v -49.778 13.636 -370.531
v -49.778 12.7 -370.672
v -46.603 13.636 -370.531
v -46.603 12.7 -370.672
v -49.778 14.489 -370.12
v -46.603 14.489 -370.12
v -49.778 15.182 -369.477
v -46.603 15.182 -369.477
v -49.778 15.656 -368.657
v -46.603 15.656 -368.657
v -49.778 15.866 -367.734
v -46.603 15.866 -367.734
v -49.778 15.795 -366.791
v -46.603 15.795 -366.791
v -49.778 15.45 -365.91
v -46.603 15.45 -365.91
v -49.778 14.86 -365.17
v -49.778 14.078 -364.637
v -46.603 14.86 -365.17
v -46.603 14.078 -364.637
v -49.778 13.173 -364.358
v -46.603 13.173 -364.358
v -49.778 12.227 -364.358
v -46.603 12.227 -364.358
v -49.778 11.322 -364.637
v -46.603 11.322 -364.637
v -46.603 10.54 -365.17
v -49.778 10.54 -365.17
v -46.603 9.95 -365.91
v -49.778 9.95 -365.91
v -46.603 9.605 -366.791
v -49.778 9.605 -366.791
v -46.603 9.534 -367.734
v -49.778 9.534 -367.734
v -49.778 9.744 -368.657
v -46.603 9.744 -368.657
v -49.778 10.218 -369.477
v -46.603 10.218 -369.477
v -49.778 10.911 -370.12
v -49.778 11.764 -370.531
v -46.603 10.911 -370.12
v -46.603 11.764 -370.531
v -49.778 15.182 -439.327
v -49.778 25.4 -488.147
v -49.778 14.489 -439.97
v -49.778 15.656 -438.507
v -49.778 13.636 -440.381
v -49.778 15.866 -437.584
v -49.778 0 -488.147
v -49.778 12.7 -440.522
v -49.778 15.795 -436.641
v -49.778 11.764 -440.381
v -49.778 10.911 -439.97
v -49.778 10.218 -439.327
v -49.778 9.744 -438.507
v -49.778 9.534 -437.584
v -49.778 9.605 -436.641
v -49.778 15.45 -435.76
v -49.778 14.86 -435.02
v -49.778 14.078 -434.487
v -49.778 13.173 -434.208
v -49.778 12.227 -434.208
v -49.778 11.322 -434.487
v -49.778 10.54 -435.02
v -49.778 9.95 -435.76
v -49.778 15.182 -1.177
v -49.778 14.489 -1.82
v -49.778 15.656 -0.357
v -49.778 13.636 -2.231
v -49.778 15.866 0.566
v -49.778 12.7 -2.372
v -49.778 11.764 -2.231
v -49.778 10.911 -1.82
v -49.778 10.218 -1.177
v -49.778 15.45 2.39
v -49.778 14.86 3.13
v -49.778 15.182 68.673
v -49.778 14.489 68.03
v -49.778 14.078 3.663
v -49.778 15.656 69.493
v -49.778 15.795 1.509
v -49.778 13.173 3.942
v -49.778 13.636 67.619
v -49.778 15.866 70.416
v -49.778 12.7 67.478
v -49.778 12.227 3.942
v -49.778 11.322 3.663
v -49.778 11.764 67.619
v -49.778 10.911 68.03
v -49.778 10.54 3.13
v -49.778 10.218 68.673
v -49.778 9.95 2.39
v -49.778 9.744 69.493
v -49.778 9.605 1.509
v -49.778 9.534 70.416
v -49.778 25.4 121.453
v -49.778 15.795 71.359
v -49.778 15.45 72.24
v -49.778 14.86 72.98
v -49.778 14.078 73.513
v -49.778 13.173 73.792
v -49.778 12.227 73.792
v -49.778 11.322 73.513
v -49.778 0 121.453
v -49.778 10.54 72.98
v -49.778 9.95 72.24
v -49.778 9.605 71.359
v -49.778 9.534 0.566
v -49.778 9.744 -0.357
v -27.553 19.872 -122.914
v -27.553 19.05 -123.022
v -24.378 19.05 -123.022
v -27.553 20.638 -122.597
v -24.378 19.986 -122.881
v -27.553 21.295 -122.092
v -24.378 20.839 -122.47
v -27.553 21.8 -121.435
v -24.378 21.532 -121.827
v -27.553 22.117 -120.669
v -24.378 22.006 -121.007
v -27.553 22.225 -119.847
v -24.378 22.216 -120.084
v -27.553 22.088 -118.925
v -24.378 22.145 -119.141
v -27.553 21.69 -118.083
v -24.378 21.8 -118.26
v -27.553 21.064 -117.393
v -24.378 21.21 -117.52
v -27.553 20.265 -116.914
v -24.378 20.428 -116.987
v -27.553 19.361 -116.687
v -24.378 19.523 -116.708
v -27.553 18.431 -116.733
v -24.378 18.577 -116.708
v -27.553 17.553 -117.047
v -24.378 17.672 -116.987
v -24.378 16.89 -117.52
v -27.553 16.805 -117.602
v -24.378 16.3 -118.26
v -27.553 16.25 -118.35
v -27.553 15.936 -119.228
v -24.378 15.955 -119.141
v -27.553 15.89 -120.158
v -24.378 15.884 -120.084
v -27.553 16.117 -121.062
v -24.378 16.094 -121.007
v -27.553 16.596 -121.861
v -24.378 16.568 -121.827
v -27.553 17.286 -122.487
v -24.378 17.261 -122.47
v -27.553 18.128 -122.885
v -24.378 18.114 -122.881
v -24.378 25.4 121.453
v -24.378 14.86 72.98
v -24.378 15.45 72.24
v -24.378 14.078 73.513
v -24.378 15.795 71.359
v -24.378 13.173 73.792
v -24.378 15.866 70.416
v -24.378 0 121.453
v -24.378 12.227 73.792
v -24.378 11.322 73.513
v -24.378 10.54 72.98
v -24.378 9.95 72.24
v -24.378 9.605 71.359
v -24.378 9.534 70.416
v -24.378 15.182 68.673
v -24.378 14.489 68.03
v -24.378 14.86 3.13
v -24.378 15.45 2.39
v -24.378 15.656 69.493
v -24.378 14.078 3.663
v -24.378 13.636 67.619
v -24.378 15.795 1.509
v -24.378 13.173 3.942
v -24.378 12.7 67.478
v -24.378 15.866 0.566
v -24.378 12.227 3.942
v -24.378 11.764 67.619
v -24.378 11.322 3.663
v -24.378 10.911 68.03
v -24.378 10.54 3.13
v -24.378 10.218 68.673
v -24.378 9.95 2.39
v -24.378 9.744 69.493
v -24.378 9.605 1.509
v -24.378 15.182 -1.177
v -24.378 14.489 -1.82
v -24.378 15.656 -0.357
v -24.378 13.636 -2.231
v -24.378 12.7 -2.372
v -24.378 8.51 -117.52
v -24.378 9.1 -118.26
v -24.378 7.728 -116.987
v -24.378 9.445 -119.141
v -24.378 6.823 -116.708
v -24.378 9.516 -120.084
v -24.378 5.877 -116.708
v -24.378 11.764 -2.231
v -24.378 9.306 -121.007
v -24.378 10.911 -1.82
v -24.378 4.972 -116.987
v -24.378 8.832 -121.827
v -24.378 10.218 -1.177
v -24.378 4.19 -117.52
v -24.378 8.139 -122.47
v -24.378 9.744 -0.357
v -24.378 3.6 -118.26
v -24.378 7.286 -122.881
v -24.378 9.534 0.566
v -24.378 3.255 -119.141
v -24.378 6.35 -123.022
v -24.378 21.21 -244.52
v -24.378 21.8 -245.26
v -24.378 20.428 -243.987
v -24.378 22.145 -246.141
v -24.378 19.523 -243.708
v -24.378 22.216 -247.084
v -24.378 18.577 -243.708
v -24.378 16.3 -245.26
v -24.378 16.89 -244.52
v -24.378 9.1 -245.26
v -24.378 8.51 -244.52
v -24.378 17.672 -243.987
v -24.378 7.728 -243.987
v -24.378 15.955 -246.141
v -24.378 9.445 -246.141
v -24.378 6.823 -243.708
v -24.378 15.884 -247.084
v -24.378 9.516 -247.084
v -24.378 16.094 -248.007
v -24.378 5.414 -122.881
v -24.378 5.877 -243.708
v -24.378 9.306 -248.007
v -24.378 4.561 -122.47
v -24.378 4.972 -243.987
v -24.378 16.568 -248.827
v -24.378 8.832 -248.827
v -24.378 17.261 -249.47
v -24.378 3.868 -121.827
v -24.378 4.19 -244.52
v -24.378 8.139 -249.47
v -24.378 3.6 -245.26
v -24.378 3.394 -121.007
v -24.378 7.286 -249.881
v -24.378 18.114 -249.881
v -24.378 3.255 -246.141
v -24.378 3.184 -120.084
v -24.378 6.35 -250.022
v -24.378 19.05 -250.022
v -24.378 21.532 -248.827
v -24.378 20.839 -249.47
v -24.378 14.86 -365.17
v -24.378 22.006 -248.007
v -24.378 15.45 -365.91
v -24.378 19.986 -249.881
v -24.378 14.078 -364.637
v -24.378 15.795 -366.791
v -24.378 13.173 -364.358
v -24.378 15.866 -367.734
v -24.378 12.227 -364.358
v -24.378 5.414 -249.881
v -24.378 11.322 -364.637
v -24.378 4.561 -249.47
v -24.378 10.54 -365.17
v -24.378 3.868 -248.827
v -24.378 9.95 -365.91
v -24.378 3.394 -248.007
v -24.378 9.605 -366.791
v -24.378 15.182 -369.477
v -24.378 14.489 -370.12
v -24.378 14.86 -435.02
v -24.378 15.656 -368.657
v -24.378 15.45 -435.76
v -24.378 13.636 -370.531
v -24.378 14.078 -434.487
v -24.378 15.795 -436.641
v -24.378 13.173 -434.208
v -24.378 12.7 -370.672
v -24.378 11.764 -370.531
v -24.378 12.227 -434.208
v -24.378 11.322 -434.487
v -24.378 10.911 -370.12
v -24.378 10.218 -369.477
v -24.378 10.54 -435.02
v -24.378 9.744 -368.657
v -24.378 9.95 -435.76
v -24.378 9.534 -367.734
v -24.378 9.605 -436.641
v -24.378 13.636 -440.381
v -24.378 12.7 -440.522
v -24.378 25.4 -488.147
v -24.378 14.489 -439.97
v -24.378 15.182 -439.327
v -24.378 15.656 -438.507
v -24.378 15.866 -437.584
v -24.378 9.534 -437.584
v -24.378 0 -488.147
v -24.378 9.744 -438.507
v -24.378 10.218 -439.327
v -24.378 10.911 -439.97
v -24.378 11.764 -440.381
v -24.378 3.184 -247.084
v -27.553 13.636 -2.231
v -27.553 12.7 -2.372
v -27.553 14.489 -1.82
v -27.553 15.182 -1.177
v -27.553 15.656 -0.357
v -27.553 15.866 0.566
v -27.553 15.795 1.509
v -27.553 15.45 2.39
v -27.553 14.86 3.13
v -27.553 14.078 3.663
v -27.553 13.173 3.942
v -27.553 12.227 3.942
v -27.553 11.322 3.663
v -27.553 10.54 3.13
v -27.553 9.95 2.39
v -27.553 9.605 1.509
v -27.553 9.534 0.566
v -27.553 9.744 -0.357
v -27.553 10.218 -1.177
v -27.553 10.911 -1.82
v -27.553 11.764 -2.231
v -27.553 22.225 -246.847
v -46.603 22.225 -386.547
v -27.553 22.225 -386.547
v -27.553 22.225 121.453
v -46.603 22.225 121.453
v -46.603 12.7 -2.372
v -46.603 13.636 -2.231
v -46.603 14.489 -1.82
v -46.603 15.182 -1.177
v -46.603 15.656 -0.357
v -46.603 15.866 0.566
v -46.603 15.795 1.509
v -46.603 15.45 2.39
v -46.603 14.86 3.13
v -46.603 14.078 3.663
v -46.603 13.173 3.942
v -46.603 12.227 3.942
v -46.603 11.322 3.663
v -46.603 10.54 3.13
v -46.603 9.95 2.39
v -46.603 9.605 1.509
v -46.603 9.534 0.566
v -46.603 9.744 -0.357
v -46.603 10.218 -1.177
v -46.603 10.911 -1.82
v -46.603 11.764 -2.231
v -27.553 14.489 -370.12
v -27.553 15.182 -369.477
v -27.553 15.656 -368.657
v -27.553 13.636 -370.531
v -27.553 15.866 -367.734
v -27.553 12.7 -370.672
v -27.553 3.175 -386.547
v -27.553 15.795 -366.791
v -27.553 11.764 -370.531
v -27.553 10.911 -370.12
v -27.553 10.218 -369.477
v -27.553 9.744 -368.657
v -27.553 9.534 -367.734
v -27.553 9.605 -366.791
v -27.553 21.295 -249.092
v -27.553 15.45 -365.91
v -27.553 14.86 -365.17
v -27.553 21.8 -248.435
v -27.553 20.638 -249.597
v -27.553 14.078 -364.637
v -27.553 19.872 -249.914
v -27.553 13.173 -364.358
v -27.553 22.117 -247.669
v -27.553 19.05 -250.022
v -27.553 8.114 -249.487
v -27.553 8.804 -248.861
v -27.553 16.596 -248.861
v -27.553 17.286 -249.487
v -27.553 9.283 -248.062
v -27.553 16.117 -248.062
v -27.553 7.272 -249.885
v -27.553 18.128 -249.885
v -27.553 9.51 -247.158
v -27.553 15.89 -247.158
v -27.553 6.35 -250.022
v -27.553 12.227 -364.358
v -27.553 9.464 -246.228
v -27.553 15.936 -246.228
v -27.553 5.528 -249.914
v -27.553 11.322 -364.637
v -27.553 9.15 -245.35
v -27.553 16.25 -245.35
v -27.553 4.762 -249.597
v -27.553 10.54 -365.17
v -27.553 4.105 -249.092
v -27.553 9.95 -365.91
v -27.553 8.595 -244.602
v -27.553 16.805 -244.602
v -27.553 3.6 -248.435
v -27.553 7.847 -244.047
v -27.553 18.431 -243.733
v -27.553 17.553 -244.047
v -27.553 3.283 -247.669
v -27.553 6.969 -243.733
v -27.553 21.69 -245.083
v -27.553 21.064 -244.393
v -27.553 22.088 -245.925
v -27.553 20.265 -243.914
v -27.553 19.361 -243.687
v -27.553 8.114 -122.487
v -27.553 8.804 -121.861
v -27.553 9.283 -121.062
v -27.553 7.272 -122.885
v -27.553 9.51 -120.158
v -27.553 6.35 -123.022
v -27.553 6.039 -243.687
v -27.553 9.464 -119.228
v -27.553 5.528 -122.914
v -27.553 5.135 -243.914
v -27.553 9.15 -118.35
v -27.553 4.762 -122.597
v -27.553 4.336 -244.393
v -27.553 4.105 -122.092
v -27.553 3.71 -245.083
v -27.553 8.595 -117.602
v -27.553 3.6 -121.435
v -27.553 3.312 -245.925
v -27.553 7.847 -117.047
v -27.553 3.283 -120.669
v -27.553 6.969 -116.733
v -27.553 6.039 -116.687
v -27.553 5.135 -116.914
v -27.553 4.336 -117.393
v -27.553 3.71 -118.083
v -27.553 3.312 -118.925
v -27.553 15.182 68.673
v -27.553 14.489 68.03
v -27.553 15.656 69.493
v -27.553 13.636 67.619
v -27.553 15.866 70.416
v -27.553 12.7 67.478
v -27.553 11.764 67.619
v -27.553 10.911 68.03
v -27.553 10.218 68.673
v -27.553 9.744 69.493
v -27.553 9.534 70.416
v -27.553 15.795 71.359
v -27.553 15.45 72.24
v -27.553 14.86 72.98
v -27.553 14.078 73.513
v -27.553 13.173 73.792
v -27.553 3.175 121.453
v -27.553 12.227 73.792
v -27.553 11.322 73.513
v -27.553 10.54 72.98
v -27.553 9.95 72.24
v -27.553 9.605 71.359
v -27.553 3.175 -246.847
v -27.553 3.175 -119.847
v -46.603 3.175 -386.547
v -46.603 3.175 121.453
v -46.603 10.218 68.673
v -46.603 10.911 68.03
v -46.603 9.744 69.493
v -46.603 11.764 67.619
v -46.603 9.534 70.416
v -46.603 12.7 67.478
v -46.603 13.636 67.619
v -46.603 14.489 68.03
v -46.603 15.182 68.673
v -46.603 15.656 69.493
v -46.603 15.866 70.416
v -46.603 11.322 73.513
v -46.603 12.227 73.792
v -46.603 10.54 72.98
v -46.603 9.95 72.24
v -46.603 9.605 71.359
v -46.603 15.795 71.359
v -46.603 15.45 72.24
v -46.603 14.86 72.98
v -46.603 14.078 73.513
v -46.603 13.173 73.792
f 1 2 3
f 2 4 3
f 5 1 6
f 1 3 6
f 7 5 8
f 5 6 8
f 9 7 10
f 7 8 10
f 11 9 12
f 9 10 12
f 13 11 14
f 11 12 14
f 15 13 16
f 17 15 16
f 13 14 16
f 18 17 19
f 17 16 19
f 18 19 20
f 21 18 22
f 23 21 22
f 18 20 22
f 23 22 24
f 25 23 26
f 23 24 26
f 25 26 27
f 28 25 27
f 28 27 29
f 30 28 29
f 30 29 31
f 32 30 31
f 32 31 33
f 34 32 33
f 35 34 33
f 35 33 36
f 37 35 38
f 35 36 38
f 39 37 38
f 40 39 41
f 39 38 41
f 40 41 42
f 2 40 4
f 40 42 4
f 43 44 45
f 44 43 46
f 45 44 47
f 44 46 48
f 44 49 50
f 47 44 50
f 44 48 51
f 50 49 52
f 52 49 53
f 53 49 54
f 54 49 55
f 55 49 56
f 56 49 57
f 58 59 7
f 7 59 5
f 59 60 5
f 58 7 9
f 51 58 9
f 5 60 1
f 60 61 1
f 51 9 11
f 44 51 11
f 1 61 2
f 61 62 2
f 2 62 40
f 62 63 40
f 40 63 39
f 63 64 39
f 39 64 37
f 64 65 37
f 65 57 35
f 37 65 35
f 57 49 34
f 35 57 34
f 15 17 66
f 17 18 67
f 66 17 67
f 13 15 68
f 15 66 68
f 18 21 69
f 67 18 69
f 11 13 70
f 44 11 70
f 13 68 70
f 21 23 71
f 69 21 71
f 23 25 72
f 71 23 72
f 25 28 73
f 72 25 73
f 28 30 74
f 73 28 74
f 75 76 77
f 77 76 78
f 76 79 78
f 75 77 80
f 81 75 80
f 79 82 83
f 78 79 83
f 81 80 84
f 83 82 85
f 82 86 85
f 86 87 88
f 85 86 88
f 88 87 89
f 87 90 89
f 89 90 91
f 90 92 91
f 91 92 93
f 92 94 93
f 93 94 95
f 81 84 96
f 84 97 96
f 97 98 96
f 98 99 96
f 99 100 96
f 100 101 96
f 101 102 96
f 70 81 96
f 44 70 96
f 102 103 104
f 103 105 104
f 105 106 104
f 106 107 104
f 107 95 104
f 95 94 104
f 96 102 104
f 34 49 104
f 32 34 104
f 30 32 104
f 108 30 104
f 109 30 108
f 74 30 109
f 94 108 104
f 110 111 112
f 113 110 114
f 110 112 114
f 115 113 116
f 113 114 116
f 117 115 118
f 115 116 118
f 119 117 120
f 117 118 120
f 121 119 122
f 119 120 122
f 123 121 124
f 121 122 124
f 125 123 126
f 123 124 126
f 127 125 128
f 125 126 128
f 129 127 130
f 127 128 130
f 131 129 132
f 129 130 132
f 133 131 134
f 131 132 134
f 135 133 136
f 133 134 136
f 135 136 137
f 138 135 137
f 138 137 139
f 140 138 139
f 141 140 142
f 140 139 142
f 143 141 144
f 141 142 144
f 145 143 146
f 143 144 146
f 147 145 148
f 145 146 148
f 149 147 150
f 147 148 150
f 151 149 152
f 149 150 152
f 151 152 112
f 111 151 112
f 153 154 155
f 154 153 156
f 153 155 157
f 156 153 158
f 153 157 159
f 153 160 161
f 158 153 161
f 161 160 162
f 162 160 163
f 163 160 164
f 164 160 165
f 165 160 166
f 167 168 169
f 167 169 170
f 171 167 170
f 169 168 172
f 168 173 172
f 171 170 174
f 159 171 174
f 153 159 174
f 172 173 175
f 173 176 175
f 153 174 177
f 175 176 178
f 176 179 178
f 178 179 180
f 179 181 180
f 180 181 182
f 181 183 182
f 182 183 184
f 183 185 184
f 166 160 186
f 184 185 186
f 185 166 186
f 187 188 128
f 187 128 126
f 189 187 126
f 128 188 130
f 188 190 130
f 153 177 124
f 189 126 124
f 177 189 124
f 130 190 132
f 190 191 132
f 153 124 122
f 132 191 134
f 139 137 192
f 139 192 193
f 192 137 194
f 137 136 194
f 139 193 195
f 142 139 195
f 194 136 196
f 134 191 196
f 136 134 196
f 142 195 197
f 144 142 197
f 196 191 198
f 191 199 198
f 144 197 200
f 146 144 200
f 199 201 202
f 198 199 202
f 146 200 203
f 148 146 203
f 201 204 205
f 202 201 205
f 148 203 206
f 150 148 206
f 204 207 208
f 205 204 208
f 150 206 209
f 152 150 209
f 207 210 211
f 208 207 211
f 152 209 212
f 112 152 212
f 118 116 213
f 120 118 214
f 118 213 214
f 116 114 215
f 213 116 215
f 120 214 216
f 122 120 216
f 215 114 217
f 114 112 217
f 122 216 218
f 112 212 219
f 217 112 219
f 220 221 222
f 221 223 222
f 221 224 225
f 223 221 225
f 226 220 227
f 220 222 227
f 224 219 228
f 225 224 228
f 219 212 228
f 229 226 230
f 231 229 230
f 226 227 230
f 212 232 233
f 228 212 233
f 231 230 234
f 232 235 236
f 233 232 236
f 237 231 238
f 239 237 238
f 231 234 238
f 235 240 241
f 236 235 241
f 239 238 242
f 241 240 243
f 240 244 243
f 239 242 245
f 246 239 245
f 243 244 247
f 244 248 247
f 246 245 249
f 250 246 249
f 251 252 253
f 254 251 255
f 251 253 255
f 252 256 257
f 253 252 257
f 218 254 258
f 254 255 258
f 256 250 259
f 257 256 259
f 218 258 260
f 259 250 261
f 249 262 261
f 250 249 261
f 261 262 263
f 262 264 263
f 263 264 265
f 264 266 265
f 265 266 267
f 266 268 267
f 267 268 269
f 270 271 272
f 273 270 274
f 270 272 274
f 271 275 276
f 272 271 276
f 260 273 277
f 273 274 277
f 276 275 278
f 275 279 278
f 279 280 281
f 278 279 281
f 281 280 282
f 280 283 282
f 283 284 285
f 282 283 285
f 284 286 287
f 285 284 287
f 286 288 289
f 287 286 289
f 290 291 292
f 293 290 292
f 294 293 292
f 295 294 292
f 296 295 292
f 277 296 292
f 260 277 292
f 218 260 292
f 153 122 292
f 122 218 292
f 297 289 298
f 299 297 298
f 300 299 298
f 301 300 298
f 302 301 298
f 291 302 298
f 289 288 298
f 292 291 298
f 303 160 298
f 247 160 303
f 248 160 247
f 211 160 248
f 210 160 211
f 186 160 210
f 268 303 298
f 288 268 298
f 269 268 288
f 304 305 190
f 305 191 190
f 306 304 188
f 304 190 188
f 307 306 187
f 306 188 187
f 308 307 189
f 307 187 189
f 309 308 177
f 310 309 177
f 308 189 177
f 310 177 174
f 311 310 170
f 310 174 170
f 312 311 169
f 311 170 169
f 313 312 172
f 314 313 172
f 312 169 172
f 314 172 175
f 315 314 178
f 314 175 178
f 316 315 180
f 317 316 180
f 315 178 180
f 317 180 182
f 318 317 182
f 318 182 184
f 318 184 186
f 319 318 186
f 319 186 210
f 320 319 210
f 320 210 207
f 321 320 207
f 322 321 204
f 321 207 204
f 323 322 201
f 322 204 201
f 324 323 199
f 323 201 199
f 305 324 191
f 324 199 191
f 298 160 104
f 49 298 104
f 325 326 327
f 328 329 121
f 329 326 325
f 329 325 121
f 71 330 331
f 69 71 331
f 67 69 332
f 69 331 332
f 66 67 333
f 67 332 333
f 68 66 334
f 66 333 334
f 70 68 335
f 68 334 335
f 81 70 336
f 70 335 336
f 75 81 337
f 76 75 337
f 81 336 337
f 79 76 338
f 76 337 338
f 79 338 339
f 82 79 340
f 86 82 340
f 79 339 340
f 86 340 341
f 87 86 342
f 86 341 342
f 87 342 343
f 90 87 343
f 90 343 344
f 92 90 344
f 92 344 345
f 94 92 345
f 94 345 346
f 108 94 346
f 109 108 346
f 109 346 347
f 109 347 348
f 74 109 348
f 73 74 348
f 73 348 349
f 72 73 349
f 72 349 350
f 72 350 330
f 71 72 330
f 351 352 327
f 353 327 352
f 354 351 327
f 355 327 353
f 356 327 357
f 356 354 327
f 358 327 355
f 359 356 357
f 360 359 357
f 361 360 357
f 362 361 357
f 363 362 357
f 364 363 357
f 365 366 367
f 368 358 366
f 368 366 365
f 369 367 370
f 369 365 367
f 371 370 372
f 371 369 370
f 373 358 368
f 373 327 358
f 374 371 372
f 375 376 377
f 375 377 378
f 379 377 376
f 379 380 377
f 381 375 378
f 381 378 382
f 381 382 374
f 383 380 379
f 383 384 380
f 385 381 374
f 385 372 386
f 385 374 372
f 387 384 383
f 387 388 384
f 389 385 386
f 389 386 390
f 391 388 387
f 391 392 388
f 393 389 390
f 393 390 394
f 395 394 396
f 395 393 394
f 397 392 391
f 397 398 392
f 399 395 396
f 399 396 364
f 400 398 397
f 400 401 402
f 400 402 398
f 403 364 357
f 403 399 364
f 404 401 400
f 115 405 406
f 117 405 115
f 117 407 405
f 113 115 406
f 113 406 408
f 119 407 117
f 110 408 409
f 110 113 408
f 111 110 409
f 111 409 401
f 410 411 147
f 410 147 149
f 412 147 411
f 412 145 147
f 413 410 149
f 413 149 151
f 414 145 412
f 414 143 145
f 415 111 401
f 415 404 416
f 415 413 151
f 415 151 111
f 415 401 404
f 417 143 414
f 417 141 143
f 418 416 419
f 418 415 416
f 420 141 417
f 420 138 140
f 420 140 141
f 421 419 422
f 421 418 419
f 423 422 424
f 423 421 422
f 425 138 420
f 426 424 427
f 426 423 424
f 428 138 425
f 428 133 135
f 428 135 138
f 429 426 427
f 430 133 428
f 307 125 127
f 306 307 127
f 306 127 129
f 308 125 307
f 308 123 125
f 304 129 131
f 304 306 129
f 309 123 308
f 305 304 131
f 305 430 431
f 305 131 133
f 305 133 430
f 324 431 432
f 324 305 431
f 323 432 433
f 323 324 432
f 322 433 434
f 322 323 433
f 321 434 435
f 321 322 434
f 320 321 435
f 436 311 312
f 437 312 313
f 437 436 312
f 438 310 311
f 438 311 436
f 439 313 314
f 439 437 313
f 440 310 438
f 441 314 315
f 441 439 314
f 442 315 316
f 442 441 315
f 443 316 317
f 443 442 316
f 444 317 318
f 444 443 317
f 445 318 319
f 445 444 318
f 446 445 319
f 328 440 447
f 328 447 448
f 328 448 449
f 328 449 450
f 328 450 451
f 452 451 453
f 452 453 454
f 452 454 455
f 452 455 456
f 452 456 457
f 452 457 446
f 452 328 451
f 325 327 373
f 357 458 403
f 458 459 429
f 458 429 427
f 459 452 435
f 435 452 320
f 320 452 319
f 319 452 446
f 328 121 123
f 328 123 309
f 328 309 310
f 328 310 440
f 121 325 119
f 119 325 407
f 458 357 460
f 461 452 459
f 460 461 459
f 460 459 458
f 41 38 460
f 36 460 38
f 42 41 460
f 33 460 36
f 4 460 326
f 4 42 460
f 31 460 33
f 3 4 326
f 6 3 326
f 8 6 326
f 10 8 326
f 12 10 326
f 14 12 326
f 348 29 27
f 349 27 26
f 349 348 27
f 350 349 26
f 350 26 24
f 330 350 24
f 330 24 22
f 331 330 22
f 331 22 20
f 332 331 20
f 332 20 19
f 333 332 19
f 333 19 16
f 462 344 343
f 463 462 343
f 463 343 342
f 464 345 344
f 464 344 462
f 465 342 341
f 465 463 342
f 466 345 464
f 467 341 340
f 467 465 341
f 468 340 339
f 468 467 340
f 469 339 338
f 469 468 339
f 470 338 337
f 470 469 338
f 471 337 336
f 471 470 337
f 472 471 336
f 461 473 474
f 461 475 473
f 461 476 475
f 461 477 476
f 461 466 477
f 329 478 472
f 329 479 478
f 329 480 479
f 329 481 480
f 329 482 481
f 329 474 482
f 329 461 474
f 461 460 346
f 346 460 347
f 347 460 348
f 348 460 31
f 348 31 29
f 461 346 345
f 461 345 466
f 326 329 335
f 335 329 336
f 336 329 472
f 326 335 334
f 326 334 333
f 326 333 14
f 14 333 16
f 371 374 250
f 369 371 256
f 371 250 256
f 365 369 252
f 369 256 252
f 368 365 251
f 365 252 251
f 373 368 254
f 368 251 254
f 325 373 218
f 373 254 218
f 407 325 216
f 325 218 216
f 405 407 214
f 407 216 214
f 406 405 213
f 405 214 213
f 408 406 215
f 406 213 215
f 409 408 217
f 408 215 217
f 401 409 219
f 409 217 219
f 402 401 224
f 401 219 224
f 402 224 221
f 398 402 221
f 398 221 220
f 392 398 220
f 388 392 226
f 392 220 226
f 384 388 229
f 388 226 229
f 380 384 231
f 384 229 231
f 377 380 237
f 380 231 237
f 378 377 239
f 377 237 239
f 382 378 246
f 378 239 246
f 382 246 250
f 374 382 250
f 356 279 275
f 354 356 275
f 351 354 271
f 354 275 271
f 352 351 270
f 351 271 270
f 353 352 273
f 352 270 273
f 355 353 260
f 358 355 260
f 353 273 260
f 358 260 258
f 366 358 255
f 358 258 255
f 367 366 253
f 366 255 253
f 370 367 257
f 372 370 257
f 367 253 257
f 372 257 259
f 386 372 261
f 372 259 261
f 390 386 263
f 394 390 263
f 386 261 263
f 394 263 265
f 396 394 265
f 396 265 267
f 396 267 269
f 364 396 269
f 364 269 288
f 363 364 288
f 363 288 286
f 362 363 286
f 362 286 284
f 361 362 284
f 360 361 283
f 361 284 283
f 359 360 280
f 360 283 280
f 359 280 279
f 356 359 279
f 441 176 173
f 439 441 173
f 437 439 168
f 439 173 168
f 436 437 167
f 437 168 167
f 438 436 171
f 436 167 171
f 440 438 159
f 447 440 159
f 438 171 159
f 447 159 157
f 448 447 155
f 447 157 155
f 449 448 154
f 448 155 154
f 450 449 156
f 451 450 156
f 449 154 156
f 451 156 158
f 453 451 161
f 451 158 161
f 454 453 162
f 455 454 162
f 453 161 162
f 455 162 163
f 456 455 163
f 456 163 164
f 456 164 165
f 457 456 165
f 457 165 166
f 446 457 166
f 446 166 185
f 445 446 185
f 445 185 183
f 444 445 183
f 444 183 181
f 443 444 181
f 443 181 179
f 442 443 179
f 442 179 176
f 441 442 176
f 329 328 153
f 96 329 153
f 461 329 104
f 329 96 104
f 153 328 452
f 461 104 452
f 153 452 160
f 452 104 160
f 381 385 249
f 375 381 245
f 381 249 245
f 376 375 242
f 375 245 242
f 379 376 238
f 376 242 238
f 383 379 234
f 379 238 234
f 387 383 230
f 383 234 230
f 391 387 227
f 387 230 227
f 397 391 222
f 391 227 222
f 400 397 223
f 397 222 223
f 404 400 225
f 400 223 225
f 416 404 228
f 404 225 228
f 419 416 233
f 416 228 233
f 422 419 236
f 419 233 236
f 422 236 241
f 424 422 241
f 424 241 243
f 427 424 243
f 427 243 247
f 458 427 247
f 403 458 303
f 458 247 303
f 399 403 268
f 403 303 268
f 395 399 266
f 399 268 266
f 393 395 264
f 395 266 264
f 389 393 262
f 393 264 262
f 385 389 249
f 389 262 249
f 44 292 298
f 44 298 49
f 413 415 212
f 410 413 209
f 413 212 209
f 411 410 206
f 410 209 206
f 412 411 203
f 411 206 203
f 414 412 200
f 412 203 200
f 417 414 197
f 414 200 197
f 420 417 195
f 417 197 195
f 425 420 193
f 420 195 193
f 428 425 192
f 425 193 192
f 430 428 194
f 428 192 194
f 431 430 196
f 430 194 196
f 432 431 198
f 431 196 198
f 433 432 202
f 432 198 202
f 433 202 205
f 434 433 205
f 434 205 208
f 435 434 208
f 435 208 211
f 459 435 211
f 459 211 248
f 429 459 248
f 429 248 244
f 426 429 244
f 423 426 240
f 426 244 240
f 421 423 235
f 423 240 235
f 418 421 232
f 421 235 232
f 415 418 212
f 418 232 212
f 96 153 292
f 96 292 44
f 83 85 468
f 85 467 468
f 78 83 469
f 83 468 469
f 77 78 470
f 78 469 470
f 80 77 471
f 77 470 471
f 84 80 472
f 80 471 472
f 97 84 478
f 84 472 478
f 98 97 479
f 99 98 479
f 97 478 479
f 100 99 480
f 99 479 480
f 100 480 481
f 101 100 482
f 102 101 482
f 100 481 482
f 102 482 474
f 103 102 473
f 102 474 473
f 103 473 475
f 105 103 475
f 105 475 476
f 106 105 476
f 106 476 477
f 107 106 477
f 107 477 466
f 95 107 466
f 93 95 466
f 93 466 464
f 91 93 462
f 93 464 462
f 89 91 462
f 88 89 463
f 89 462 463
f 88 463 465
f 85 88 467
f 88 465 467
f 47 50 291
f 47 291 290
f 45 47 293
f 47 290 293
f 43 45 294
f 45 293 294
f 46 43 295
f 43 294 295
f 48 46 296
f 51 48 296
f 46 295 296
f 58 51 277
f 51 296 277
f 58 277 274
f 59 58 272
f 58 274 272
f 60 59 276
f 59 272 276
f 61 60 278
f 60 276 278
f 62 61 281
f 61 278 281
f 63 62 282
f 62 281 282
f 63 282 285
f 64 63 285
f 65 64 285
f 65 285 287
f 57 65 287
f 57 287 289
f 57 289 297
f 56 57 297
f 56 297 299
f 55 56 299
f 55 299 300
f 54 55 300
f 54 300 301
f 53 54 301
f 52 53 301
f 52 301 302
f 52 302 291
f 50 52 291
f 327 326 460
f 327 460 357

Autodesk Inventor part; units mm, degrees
ref_plane "YZ Plane" through (0, 0, 0) normal (1, 0, 0) x (0, 1, 0)
ref_plane "XZ Plane" through (0, 0, 0) normal (0, 1, 0) x (-1, 0, 0)
ref_plane "XY Plane" through (0, 0, 0) normal (0, 0, 1) x (1, 0, 0)
sketch "Sketch1" plane through (0, 0, 0) normal (0, 1, 0) x (-1, 0, 0)
  line L0 (49.7782, 121.4529) -> (24.3782, 121.4529)
  line L1 (24.3782, 121.4529) -> (24.3782, -488.1471)
  line L2 (24.3782, -488.1471) -> (49.7782, -488.1471)
  line L3 (49.7782, -488.1471) -> (49.7782, 121.4529)
  point P0 (0, 0)
  dimension "d0" = 25.4
  dimension "d1" = 609.6
extrude "Extrusion1" add sketch "Sketch1" along normal blind 25.4
sketch "Sketch2" plane through (-49.7782, 0, 121.4529) normal (0, 0, 1) x (1, 0, 0)
  line L0 (0, 25.4) -> (25.4, 25.4)
  line L1 (25.4, 25.4) -> (25.4, 0)
  line L2 (25.4, 0) -> (0, 0)
  line L3 (0, 0) -> (0, 25.4)
  line L4 (3.175, 22.225) -> (22.225, 22.225)
  line L5 (22.225, 22.225) -> (22.225, 3.175)
  line L6 (22.225, 3.175) -> (3.175, 3.175)
  line L7 (3.175, 3.175) -> (3.175, 22.225)
  point P0 (49.7782, 0)
  dimension "d5" = 3.175
  dimension "d6" = 3.175
  dimension "d7" = 3.175
  dimension "d8" = 3.175
extrude "Extrusion2" cut sketch "Sketch2" against normal blind 508 contours L4 L5 L6 L7
sketch "Sketch3" plane through (-24.3782, 0, 121.4529) normal (1, 0, 0) x (0, 0, -1)
  circle A0 centre (241.3, 19.05) radius 3.175
  circle A1 centre (241.3, 6.35) radius 3.175
  line L0 (0, 25.4) -> (609.6, 25.4) projected
  line L1 (0, 0) -> (0, 25.4) projected
  line L2 (304.8, 25.4) -> (304.8, 0) construction
  circle A2 centre (368.3, 19.05) radius 3.175
  circle A3 centre (368.3, 6.35) radius 3.175
  point P0 (121.4529, 0)
  dimension "d11" = 6.35
  dimension "d12" = 6.35
  dimension "d14" = 12.7
  dimension "d15" = 6.35
  dimension "d26" = 304.8
  dimension "d27" = 63.5
  dimension "d28" = 63.5
extrude "Extrusion3" cut sketch "Sketch3" against normal blind 12.7
sketch "Sketch4" plane through (-24.3782, 0, 121.4529) normal (1, 0, 0) x (0, 0, -1)
  line L0 (0, 25.4) -> (609.6, 25.4) construction
  line L1 (304.8, 25.4) -> (304.8, 0) construction
  line L2 (0, 0) -> (0, 25.4) construction
  line L3 (120.65, 25.4) -> (120.65, 0) construction
  circle A0 centre (120.65, 12.7) radius 3.175
  circle A1 centre (488.95, 12.7) radius 3.175
  point P0 (121.4529, 0)
  dimension "d20" = 304.8
  dimension "d21" = 184.15
  dimension "d22" = 6.35
  dimension "d23" = 12.7
extrude "Extrusion4" cut sketch "Sketch4" against normal blind 25.4
sketch "Sketch6" plane through (-24.3782, 0, 121.4529) normal (1, 0, 0) x (0, 0, -1)
  line L0 (0, 0) -> (609.6, 0) projected
  line L1 (304.8, 0) -> (304.8, 25.4)
  line L2 (0, 25.4) -> (609.6, 25.4) projected
  line L3 (0, 0) -> (0, 25.4) projected
  circle A0 centre (50.8, 12.7) radius 3.175
  circle A1 centre (558.8, 12.7) radius 3.175
  point P0 (121.4529, 0)
  dimension "d29" = 304.8
  dimension "d30" = 6.35
  dimension "d31" = 12.7
  dimension "d32" = 254
extrude "Extrusion5" cut sketch "Sketch6" against normal blind 25.4 contours A0 | A1
properties part number "clawBase"
